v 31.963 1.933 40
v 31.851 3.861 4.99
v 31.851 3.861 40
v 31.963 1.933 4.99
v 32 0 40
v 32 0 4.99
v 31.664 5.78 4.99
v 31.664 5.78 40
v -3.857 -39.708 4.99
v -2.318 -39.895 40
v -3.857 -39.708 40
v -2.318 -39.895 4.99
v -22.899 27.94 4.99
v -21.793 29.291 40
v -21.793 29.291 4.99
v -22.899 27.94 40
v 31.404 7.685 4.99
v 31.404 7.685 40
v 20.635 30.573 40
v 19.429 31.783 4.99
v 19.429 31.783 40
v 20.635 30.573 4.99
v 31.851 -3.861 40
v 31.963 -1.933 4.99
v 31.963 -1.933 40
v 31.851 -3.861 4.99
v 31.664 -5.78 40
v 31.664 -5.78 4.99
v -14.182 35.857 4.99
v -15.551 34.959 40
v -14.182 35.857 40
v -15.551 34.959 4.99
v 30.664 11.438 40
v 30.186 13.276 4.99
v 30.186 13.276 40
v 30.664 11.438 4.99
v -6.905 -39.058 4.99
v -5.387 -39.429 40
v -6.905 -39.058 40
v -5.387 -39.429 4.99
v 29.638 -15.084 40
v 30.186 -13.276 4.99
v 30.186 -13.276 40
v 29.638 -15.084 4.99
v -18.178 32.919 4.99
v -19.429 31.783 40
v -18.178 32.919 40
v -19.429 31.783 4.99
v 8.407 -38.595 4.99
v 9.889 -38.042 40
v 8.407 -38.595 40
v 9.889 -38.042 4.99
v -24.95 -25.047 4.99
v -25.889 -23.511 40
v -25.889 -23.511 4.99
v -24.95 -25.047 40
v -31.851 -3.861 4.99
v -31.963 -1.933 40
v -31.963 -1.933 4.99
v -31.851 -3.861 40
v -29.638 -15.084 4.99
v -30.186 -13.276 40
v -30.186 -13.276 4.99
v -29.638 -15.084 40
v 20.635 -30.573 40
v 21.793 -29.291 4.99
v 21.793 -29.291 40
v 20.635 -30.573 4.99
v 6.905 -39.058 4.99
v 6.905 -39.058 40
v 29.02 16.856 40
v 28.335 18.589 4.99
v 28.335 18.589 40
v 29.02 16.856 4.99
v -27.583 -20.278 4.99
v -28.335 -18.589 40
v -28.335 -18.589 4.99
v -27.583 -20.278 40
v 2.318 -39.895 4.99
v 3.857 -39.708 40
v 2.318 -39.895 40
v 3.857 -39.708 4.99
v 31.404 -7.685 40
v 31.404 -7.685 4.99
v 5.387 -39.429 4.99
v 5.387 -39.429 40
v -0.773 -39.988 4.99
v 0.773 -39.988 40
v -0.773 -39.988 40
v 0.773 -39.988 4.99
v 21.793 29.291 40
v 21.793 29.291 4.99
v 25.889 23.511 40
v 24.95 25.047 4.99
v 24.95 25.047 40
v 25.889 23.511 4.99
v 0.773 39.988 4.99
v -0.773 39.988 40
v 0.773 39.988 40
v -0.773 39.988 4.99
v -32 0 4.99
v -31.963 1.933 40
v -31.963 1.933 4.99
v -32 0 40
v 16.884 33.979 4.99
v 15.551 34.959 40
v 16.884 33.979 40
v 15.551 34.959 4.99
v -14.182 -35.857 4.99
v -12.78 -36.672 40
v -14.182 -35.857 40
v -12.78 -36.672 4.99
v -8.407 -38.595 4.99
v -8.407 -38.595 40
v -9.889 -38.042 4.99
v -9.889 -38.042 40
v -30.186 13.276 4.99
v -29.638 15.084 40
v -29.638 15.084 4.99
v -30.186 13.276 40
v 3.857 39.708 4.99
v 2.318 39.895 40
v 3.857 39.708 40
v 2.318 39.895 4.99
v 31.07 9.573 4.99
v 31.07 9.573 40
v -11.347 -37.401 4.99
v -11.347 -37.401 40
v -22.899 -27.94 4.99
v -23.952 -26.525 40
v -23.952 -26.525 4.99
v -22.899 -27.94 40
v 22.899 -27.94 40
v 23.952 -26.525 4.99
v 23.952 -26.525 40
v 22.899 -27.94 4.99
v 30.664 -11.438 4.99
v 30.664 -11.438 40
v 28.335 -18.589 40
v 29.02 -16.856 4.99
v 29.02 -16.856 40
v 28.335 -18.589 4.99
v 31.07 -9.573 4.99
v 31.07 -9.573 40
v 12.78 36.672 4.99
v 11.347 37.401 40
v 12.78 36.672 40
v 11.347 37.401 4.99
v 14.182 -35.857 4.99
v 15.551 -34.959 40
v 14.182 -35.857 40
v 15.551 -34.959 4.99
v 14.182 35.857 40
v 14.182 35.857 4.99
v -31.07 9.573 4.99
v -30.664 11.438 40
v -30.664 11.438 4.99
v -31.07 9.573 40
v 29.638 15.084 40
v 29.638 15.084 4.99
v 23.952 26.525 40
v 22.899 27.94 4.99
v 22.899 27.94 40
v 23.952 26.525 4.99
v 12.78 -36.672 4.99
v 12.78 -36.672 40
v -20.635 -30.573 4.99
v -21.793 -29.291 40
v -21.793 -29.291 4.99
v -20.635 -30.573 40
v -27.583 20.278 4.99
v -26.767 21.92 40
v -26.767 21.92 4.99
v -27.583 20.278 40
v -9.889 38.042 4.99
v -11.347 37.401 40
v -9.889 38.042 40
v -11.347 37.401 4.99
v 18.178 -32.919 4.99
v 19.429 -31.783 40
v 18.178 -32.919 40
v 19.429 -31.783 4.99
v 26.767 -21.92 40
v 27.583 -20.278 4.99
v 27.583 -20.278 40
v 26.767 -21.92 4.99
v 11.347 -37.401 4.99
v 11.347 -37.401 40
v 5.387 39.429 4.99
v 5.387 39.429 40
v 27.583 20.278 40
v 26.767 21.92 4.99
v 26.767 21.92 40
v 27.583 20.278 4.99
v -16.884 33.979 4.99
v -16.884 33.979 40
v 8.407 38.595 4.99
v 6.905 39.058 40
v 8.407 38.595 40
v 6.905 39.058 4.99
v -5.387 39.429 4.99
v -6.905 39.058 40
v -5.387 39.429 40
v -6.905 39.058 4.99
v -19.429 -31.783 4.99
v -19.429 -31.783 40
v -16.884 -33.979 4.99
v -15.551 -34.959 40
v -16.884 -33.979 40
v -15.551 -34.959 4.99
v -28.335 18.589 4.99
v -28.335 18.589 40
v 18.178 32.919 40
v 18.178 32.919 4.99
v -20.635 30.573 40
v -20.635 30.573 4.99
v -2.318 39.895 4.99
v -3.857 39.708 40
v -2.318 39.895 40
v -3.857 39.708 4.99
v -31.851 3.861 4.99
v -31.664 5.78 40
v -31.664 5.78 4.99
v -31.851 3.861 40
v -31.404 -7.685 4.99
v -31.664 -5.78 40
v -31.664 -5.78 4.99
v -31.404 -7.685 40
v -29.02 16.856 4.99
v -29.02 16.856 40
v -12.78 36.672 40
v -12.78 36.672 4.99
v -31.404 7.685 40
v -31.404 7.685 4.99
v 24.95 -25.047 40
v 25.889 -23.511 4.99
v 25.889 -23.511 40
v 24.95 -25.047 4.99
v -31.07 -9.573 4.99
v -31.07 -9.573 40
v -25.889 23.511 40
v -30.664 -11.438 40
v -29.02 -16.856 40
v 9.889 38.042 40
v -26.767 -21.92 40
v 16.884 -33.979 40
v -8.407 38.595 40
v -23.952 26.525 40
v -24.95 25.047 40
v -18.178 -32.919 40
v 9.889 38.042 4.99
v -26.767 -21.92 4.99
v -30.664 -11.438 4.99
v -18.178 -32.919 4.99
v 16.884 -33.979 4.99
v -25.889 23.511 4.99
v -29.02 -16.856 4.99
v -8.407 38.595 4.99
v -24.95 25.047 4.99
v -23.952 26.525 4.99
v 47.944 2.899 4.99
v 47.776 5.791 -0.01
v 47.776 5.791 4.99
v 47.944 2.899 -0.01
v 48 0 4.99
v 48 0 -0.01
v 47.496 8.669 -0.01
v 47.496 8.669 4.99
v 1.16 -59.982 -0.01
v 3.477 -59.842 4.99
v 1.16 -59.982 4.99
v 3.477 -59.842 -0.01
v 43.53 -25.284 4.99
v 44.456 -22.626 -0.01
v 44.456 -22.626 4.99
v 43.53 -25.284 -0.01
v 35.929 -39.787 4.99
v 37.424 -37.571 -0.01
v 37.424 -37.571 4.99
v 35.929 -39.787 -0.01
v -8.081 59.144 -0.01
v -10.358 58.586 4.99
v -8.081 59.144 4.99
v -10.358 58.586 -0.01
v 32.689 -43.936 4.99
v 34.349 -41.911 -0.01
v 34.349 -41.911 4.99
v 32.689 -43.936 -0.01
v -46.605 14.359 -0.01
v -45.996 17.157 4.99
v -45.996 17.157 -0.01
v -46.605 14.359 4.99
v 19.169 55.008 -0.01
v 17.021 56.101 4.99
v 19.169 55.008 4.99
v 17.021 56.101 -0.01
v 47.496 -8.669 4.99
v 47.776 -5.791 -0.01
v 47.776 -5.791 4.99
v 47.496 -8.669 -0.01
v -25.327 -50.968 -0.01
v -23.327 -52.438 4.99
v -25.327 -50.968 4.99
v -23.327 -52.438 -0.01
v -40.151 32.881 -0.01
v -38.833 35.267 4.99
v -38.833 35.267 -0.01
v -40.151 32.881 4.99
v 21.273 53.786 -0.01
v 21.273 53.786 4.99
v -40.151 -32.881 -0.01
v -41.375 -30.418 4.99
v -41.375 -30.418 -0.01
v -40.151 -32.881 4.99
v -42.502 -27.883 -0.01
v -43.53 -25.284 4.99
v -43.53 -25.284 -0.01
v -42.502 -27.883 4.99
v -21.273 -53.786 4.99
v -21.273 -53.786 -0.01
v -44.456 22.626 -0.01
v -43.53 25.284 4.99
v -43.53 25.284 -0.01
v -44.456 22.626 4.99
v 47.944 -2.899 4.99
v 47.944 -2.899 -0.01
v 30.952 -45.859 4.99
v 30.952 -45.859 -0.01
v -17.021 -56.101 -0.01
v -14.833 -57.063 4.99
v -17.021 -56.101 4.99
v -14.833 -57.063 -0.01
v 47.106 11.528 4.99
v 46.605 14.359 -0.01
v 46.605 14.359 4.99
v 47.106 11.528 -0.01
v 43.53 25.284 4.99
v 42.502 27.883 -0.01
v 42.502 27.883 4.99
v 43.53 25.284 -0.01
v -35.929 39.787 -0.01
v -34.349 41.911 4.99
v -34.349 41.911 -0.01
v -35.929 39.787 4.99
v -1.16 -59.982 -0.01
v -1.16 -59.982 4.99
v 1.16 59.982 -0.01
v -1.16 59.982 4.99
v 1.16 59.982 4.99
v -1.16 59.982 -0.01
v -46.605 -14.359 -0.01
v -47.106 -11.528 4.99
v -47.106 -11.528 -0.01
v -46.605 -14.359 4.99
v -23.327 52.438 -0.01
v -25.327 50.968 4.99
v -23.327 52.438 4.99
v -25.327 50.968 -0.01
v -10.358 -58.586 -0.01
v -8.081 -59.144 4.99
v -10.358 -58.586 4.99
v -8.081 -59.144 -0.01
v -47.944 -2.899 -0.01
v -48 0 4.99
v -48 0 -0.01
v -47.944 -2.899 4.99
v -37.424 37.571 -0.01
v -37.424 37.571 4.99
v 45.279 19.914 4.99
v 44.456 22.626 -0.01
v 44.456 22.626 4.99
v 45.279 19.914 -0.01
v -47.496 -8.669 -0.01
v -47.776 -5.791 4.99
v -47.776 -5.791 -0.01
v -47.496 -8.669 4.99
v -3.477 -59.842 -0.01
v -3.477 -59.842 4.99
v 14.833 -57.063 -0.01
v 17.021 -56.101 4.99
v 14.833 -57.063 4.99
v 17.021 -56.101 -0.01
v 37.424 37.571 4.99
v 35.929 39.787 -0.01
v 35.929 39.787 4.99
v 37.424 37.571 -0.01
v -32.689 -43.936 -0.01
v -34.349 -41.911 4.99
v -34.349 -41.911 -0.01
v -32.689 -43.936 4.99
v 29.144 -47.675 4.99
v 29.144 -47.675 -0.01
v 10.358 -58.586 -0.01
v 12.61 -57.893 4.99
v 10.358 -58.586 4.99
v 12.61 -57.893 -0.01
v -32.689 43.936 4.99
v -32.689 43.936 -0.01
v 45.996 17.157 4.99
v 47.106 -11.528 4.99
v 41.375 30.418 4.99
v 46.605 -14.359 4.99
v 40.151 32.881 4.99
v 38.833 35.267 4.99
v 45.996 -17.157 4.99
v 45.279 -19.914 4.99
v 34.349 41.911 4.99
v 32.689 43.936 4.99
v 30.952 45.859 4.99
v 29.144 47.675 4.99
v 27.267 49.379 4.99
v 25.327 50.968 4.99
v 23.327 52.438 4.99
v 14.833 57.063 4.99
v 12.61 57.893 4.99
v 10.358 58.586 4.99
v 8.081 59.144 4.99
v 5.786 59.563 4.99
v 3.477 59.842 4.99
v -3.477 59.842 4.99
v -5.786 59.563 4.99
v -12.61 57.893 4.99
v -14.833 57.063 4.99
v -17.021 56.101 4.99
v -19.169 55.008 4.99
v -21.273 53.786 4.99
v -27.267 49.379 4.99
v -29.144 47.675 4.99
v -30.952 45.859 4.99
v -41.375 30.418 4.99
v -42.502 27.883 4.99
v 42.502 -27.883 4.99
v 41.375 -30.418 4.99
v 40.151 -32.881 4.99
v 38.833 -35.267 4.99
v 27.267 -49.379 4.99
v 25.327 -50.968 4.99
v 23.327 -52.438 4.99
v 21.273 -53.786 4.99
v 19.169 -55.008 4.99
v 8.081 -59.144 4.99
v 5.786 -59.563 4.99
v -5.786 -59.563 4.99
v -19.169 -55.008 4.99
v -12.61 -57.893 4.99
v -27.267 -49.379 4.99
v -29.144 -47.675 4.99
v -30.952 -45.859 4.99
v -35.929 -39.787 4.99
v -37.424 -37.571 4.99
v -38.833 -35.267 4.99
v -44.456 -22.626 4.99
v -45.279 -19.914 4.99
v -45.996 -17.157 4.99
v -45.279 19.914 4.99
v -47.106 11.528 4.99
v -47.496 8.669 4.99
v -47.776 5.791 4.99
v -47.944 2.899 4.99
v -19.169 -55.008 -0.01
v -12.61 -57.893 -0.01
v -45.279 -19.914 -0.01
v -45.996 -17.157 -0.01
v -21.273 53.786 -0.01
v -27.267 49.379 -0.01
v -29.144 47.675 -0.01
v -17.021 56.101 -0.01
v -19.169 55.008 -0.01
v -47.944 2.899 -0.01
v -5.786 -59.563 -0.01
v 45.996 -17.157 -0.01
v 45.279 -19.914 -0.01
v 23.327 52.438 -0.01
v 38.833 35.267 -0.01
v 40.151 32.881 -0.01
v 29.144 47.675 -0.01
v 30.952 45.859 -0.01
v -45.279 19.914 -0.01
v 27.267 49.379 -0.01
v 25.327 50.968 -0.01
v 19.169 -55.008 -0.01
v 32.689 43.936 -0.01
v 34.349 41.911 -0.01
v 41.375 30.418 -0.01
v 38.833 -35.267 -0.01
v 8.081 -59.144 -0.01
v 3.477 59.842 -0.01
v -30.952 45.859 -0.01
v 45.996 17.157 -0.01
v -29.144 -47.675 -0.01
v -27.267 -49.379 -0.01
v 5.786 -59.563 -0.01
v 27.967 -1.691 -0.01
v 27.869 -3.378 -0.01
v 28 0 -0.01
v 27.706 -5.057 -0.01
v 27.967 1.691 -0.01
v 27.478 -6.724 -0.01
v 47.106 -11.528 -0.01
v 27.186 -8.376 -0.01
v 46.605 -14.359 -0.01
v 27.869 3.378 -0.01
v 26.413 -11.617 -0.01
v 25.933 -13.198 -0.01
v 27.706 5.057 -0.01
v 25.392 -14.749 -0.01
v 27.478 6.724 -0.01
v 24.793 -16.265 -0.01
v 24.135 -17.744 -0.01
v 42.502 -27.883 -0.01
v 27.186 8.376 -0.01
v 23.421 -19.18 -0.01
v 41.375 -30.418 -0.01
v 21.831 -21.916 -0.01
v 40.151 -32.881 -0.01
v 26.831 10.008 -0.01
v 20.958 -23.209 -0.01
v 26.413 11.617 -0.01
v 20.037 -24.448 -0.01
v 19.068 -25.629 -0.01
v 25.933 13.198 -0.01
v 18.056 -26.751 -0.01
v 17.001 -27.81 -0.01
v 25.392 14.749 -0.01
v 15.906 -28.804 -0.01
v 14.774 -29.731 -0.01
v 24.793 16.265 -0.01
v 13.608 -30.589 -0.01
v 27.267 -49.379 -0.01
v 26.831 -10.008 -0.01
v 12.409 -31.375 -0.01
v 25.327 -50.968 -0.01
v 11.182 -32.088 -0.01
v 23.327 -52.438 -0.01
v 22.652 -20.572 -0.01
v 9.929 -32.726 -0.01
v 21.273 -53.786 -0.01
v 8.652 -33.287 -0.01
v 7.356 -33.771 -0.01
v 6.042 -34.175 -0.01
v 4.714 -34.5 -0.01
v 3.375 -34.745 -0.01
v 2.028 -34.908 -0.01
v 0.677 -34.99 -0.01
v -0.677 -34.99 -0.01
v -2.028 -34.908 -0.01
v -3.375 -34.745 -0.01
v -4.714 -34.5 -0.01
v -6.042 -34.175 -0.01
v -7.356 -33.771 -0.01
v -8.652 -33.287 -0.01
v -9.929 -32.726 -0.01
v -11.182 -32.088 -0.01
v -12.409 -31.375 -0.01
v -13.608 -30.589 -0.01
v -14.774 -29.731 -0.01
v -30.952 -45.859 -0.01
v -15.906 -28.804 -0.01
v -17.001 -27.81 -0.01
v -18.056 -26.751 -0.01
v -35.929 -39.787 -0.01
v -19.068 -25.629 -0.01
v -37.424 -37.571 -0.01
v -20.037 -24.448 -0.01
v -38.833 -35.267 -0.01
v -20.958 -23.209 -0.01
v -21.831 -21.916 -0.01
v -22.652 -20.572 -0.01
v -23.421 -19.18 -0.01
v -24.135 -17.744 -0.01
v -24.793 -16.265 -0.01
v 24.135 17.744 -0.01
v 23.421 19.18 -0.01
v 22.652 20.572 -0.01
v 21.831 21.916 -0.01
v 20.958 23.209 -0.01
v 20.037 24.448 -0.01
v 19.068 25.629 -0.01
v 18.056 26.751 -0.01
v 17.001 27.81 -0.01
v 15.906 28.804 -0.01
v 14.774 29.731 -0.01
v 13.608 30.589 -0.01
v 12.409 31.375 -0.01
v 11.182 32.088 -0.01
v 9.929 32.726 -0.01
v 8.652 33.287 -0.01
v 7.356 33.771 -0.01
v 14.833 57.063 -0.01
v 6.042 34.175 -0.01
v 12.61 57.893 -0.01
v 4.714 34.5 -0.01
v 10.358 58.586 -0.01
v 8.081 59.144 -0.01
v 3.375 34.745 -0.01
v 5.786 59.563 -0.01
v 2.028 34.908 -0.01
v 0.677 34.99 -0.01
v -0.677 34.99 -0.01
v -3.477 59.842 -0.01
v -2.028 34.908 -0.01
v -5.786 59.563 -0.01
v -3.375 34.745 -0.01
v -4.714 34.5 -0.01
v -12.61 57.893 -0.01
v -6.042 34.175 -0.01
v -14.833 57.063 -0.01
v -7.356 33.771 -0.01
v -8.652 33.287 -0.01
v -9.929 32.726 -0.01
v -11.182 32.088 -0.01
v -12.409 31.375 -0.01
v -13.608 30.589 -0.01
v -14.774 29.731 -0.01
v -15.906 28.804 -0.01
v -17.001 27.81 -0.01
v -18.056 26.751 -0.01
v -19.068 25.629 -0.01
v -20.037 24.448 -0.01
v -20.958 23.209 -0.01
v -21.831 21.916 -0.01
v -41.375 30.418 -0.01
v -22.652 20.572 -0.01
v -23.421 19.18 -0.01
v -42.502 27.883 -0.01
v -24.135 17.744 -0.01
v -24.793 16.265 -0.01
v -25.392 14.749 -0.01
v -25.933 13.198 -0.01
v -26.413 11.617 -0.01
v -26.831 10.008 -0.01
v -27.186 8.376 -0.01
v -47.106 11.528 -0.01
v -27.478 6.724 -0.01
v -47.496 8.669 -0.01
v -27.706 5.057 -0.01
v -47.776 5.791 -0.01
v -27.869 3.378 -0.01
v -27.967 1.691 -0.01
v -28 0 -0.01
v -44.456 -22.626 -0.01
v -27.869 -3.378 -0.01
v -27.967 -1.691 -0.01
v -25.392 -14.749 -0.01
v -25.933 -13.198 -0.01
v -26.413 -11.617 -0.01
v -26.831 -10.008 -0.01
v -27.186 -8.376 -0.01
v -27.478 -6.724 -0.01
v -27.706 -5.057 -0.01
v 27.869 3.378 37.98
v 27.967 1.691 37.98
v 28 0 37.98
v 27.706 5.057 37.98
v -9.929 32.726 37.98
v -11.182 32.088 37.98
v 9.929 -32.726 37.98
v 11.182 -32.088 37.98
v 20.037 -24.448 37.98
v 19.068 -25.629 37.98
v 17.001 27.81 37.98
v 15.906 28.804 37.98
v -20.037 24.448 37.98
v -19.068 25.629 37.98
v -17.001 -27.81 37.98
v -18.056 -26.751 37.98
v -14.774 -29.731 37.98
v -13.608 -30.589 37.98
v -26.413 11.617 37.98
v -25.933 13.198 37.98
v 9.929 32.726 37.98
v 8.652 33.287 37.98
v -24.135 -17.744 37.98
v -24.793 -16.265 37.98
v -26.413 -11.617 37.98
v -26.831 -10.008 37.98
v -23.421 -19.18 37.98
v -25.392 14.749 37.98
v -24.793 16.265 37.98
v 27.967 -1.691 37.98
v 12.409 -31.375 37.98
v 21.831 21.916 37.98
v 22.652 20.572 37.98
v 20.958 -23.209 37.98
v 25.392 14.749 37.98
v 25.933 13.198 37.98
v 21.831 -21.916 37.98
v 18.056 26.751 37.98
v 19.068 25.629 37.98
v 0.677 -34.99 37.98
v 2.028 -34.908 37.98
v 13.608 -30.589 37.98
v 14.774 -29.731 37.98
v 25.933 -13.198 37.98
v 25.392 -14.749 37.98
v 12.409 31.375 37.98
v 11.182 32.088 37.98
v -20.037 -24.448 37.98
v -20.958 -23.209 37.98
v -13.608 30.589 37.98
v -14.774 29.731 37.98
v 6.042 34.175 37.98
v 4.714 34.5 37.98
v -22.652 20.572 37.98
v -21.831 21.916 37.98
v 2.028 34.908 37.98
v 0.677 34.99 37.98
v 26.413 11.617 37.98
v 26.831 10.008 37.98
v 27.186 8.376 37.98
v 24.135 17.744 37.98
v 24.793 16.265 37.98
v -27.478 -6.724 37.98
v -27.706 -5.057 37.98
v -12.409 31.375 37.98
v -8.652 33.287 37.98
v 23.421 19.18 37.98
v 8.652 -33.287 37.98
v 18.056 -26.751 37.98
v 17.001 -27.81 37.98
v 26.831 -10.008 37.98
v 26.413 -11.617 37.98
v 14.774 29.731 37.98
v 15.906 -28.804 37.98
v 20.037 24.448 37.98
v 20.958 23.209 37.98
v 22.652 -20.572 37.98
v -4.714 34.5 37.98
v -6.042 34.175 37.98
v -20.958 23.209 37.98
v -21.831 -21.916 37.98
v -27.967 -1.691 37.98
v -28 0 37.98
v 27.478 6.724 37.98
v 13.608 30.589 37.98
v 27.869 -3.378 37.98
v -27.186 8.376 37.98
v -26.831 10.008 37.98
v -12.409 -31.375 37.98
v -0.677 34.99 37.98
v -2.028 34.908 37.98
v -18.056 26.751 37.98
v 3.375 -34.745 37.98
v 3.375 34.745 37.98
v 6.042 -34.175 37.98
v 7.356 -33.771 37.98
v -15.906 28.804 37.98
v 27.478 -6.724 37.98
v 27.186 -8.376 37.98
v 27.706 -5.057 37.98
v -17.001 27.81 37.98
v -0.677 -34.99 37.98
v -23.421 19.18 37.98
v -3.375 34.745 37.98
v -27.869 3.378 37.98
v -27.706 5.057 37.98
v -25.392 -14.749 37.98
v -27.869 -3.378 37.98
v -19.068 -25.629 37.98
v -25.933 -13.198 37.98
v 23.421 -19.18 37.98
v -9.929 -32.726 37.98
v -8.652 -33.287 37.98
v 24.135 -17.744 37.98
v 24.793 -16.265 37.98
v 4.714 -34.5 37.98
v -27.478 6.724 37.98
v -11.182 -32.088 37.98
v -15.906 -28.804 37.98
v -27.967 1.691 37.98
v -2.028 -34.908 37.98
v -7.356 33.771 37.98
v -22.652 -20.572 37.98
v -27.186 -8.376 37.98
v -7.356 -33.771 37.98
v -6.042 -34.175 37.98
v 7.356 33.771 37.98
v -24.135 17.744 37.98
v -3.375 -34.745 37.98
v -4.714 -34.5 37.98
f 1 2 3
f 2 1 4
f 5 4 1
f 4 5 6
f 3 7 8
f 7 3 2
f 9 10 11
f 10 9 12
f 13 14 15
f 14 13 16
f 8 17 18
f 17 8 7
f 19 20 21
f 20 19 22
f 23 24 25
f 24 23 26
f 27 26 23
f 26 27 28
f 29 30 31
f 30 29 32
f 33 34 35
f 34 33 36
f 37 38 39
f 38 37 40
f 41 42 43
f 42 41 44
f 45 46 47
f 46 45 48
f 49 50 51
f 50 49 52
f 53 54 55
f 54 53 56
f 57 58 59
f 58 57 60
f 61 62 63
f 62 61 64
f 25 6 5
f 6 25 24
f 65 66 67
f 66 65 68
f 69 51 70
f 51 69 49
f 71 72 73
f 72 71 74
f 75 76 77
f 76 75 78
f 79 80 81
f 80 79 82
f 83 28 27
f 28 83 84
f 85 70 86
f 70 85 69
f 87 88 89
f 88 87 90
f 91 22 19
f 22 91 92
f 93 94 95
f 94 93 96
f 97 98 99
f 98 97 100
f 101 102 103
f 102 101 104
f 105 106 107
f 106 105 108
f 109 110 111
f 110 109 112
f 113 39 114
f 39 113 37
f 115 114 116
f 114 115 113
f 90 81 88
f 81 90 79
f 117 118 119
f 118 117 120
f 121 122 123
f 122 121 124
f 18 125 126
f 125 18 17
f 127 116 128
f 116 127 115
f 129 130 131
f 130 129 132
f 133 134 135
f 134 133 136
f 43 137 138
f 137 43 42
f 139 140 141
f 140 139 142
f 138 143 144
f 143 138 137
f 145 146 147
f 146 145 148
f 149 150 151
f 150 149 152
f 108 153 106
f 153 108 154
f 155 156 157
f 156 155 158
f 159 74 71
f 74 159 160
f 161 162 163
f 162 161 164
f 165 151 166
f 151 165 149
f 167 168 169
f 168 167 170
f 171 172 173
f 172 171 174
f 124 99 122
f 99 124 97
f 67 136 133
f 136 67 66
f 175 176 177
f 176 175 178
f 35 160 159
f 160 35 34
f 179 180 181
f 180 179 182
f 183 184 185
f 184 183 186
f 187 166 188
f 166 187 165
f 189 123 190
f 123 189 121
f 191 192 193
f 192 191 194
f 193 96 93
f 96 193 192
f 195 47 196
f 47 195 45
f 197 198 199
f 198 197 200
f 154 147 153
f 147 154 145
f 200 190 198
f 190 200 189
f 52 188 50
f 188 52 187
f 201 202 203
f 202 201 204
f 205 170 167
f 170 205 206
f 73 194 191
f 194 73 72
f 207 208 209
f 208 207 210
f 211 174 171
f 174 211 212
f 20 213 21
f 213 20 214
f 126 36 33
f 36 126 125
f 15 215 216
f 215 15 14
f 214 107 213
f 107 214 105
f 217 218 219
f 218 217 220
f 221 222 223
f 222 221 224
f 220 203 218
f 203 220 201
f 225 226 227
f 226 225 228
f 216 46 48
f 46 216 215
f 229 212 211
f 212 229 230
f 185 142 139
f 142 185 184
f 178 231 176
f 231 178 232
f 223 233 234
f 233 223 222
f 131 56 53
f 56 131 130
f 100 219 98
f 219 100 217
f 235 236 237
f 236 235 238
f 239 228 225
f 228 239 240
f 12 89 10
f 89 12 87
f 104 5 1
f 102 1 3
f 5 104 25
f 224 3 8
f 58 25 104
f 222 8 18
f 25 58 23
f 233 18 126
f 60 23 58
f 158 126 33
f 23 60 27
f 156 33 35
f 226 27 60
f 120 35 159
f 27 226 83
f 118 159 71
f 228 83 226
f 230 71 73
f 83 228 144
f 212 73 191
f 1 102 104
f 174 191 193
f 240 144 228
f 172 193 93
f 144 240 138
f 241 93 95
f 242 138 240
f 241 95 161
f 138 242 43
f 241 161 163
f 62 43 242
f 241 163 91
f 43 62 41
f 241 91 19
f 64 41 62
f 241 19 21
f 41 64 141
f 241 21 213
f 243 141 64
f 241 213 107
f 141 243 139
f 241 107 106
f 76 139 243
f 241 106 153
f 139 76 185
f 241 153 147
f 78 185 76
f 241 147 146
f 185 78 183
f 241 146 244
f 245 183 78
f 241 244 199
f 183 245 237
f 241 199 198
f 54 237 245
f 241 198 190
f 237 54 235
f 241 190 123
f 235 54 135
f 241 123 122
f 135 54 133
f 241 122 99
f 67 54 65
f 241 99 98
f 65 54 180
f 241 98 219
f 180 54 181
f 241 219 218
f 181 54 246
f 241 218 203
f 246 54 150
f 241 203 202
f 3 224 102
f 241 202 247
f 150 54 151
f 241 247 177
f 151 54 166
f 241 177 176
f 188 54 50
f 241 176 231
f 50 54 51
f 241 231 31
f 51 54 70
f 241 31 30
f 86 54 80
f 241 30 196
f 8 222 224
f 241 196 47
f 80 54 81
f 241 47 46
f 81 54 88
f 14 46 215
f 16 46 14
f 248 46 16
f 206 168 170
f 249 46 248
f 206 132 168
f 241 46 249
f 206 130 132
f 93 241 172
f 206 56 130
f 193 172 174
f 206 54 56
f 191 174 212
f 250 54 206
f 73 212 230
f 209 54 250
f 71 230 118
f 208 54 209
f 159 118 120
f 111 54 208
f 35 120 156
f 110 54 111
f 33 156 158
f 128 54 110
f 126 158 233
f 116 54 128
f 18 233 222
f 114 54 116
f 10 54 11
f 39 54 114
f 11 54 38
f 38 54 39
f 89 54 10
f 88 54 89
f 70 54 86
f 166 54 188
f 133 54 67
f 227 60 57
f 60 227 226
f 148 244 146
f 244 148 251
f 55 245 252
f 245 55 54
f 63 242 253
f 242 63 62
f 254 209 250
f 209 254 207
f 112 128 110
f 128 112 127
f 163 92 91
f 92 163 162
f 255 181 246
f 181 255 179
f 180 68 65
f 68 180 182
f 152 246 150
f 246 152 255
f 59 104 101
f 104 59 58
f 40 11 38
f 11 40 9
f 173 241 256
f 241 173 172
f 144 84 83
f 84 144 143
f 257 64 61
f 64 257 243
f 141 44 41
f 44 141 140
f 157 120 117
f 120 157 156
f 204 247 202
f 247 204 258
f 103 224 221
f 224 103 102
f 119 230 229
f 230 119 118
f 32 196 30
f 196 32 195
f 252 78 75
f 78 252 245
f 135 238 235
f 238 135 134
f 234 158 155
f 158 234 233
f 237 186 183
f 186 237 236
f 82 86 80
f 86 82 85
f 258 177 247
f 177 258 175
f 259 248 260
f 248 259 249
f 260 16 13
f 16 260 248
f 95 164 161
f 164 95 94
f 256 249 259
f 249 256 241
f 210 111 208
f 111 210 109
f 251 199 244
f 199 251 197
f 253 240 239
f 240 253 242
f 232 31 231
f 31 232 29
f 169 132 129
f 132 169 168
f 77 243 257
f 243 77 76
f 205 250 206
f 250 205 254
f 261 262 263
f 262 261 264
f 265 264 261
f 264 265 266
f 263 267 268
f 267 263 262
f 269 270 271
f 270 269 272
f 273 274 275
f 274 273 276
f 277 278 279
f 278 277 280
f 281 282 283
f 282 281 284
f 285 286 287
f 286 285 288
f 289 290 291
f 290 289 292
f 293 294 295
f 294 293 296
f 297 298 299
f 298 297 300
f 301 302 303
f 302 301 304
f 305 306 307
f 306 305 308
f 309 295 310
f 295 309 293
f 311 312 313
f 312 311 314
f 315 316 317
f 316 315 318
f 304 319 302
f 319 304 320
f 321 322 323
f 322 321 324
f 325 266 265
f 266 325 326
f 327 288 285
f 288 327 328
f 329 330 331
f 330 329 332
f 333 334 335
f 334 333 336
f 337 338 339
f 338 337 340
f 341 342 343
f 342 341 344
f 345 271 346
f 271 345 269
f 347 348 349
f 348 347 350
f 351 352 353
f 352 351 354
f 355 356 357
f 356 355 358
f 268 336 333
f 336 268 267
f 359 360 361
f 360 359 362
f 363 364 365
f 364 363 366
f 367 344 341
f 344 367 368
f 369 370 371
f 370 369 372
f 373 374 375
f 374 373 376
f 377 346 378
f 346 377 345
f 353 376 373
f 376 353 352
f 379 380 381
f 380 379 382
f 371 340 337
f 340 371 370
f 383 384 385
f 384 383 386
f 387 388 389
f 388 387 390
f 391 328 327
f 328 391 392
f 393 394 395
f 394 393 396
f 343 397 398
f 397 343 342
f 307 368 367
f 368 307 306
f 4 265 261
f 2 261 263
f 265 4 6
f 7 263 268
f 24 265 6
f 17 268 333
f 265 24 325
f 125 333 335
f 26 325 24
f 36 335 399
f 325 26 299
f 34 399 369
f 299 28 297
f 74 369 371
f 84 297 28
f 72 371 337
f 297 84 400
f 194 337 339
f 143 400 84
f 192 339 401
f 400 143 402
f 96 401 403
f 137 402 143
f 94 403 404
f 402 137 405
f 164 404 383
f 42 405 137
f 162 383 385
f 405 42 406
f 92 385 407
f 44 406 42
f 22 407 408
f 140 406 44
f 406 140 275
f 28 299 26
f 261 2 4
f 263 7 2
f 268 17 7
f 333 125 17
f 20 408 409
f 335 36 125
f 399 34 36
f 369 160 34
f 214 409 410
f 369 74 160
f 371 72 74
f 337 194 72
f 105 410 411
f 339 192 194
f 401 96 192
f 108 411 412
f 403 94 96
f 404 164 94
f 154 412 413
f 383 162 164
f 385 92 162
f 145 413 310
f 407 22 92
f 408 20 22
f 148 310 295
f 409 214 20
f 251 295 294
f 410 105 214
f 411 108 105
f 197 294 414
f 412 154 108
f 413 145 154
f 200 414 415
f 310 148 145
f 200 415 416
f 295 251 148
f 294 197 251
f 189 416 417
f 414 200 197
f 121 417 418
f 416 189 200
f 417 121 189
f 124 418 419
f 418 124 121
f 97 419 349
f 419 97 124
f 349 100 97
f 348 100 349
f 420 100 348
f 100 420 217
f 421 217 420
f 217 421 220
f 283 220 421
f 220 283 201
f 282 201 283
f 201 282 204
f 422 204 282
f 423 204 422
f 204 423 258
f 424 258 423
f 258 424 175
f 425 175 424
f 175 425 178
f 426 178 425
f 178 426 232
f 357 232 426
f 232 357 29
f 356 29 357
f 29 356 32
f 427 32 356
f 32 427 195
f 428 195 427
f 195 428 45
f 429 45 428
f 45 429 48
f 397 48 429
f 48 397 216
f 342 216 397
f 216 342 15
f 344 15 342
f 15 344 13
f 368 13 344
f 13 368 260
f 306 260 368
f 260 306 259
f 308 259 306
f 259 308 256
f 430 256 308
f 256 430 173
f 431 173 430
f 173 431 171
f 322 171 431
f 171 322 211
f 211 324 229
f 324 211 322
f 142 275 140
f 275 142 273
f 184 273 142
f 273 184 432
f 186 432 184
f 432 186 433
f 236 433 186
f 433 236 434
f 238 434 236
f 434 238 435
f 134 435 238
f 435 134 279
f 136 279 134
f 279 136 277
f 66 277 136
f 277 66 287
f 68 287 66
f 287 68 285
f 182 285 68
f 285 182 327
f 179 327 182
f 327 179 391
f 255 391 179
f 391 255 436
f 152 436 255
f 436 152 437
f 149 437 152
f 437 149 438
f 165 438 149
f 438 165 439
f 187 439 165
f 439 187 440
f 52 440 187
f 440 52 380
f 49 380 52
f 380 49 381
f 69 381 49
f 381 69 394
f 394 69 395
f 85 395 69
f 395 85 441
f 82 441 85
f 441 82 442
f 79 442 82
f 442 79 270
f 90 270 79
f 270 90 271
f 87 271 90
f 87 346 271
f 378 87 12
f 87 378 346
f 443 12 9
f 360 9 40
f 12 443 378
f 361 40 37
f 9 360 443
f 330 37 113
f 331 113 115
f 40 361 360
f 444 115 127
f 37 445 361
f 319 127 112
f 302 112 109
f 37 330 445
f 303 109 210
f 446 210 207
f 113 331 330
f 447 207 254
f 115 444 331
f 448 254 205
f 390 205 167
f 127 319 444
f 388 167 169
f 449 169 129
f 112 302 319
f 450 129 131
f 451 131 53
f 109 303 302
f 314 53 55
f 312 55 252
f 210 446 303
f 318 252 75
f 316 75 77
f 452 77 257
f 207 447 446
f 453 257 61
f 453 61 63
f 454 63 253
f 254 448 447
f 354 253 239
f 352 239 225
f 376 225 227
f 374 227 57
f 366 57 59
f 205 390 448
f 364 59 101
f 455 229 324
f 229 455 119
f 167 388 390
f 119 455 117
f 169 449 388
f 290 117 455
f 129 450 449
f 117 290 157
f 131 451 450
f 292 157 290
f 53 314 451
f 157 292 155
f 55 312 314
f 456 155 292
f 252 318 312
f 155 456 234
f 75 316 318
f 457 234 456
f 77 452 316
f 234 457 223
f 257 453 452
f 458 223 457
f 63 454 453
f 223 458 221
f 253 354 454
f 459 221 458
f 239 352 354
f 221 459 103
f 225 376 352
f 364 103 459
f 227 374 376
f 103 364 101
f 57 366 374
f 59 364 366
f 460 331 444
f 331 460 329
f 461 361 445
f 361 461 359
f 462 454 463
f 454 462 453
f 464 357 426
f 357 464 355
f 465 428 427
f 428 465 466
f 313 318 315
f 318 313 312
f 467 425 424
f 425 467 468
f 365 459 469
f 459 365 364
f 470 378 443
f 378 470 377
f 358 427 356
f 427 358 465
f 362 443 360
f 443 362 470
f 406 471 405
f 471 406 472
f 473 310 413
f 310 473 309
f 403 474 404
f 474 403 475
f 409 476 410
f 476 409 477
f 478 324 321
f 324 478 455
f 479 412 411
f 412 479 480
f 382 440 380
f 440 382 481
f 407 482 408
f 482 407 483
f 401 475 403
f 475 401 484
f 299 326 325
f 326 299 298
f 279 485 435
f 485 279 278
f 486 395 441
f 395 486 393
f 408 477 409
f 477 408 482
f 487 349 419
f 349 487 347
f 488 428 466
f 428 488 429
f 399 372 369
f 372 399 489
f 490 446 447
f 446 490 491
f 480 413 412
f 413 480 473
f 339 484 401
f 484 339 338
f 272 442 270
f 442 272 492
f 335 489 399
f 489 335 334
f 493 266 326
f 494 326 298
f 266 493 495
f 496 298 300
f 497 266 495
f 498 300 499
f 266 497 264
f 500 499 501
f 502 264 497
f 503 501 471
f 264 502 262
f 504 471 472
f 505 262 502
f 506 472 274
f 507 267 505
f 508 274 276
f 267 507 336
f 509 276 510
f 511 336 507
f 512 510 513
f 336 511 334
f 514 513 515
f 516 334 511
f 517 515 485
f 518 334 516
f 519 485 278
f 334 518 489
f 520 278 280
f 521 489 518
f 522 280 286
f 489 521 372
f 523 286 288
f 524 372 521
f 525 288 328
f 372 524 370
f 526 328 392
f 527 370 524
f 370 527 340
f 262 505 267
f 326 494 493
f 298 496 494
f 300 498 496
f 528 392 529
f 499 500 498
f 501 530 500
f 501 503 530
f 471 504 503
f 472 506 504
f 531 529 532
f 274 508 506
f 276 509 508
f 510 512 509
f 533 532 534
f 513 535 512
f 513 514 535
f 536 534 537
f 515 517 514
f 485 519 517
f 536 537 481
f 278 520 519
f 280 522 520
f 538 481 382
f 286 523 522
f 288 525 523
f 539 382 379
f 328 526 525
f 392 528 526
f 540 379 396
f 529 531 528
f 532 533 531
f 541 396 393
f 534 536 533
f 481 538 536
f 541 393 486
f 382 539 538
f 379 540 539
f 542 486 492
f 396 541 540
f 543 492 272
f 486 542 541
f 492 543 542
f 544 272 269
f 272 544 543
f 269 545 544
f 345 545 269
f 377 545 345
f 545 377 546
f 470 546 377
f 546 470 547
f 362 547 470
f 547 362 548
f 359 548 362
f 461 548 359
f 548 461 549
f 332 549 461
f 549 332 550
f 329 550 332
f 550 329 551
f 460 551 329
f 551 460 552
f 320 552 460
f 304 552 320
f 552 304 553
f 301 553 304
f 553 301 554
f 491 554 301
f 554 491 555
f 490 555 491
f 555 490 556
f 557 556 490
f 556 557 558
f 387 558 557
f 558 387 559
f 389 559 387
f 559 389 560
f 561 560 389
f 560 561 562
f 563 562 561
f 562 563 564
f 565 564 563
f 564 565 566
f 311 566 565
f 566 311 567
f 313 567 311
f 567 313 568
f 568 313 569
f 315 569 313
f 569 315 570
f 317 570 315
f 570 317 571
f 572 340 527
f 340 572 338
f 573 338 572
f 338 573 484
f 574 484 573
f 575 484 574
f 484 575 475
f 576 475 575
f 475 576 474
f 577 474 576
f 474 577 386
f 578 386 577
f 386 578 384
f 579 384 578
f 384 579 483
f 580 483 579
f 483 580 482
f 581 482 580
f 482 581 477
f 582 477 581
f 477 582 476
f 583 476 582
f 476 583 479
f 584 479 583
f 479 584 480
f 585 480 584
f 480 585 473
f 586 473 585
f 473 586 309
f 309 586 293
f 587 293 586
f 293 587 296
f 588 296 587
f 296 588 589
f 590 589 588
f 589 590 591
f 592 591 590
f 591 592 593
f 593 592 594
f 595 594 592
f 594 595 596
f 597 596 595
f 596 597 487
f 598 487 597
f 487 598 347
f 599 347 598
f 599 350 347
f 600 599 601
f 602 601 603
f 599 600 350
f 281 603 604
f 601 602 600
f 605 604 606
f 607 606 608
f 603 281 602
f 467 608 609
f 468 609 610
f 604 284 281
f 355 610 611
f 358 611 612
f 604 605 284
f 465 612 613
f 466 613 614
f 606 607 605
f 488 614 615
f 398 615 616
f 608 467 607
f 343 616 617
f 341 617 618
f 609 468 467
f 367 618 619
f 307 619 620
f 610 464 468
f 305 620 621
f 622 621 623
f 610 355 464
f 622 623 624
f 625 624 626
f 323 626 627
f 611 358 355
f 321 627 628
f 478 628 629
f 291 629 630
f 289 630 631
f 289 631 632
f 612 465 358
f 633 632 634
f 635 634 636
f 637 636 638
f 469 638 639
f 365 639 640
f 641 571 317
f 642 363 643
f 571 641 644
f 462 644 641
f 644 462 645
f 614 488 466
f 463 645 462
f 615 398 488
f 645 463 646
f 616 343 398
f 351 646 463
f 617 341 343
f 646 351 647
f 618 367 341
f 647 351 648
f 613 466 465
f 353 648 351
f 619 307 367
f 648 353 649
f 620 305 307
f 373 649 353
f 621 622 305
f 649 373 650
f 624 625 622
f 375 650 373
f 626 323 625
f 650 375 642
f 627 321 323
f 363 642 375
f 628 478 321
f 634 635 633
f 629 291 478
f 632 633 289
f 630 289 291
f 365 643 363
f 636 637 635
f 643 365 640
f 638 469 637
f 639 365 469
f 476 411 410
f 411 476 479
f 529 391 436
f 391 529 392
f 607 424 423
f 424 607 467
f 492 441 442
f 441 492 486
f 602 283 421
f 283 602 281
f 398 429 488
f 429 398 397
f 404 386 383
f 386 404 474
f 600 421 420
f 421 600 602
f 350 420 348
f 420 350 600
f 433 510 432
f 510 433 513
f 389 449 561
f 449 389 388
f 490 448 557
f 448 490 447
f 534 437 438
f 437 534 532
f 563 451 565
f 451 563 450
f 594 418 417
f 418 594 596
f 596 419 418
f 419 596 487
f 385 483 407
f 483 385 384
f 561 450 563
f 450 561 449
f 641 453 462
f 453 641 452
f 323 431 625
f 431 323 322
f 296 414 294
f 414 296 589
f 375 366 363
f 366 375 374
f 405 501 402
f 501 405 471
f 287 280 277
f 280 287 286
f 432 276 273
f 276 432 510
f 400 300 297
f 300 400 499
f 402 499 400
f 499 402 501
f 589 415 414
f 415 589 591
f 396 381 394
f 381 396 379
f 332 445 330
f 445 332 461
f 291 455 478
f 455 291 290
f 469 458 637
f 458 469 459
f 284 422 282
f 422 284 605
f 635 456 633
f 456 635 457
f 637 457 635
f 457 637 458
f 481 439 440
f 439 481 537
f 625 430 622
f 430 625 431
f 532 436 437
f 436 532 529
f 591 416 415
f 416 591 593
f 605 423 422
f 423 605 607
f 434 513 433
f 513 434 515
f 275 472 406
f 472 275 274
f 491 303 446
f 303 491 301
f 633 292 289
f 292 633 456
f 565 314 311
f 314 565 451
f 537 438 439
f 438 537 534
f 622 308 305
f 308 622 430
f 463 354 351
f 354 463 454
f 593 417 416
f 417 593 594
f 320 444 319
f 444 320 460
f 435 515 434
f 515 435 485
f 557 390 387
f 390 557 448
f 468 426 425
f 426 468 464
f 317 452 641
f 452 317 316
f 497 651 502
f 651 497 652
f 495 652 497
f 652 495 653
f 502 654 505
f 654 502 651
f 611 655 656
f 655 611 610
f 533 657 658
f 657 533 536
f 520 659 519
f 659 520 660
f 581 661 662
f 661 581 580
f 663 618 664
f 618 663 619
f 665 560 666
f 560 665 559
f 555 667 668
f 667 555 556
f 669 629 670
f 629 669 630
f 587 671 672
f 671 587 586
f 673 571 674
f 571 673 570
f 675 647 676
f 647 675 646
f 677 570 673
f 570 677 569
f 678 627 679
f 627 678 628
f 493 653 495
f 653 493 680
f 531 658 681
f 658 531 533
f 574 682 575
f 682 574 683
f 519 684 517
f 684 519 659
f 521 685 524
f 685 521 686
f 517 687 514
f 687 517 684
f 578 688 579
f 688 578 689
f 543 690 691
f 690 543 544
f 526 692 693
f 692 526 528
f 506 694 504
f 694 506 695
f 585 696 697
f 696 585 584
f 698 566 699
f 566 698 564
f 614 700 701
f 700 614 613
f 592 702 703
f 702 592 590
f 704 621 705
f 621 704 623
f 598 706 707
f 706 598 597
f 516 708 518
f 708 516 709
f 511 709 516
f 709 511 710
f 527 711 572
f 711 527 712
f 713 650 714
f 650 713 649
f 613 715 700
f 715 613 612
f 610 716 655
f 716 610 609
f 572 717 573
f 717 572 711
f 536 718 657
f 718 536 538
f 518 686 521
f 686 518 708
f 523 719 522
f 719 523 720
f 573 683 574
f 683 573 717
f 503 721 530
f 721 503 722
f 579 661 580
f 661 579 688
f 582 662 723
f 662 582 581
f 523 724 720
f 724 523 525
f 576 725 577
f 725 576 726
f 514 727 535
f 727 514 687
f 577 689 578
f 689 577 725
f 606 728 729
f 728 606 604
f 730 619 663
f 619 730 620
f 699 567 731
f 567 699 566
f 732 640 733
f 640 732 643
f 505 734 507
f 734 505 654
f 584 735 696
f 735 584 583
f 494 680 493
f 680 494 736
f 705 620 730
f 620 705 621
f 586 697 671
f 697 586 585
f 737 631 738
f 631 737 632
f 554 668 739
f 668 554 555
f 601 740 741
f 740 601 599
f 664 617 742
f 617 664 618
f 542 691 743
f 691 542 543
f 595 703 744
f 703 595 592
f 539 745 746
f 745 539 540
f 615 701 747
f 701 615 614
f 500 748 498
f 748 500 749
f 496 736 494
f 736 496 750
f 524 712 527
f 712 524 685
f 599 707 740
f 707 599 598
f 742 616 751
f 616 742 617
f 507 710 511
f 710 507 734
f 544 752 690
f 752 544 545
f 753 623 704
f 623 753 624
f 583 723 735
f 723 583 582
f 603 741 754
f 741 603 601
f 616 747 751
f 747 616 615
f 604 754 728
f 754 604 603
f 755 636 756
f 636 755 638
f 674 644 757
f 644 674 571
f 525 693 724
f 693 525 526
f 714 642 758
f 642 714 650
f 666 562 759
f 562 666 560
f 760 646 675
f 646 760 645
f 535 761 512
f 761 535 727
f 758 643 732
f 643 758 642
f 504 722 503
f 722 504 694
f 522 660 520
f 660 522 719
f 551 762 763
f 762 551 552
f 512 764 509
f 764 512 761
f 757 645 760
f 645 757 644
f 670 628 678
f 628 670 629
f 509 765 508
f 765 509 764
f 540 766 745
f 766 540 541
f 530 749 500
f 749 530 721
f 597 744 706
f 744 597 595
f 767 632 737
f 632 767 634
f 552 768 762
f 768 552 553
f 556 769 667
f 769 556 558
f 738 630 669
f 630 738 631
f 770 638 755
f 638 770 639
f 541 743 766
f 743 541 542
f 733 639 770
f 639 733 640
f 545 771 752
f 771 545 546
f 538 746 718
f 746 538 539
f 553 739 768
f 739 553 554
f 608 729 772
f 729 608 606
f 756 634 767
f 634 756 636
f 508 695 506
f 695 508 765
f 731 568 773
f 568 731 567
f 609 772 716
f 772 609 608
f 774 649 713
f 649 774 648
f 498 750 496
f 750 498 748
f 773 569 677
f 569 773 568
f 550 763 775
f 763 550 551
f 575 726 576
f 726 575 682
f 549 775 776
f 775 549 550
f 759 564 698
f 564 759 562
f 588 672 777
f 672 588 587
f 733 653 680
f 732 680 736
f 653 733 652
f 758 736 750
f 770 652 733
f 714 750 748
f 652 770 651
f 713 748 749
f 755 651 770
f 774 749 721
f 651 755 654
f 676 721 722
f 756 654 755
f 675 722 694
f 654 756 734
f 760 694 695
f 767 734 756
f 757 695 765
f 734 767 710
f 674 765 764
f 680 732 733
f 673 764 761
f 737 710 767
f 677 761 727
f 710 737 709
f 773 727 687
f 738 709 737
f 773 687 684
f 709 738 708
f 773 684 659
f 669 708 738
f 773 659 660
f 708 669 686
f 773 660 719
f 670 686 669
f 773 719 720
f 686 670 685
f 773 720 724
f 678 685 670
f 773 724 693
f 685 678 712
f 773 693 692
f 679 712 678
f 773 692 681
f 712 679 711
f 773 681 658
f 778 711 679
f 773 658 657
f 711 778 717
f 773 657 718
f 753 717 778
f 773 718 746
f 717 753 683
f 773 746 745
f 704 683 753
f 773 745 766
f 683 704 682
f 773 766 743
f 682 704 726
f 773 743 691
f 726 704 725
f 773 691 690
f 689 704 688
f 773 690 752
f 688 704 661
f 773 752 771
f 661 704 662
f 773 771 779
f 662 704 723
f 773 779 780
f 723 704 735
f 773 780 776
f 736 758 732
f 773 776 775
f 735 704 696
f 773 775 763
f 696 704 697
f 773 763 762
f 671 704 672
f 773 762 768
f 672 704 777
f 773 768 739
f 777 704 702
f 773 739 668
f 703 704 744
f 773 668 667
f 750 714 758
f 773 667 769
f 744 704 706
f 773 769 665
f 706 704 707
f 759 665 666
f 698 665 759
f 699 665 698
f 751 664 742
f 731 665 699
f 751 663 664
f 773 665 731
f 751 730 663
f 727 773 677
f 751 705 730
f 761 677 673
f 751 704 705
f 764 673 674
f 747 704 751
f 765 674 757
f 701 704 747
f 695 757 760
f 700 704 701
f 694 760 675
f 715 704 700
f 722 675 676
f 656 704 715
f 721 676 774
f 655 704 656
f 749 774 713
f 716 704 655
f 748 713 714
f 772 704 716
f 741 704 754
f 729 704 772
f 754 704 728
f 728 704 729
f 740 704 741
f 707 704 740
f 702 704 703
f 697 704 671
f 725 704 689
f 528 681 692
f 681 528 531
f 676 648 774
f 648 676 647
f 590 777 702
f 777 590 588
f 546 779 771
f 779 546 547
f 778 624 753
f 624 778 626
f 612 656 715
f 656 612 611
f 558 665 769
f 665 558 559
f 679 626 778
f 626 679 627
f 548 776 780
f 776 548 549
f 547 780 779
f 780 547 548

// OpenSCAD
$fn = 130;

arm_length = 200;
finger_length = 30;
finger_radius = 3;
arm_radius = 5;

nose_radius = 7.0;
nose_length = 40.0;

module arm() {
    translate([0, 3, 0]) linear_extrude(height=arm_length, twist=80, scale=0.7) translate([5.0, 0, 0])
        polygon([
            [cos(0)*arm_radius*0.90,   sin(0)*arm_radius*0.90],
            [cos(15)*arm_radius*1.05,  sin(15)*arm_radius*1.05],
            [cos(30)*arm_radius*0.97,  sin(30)*arm_radius*0.97],
            [cos(45)*arm_radius*1.01,  sin(45)*arm_radius*1.01],
            [cos(60)*arm_radius*0.95,  sin(60)*arm_radius*0.95],
            [cos(75)*arm_radius*1.02,  sin(75)*arm_radius*1.02],
            [cos(90)*arm_radius*0.99,  sin(90)*arm_radius*0.99],
            [cos(105)*arm_radius*1.05, sin(105)*arm_radius*1.05],
            [cos(120)*arm_radius*0.92, sin(120)*arm_radius*0.92],
            [cos(135)*arm_radius*1.03, sin(135)*arm_radius*1.03],
            [cos(150)*arm_radius*0.95, sin(150)*arm_radius*0.95],
            [cos(165)*arm_radius*1.03, sin(165)*arm_radius*1.03],
            [cos(180)*arm_radius*0.94, sin(180)*arm_radius*0.94],
            [cos(195)*arm_radius*1.07, sin(195)*arm_radius*1.07],
            [cos(210)*arm_radius*0.94, sin(210)*arm_radius*0.94],
            [cos(225)*arm_radius*1.04, sin(225)*arm_radius*1.04],
            [cos(240)*arm_radius*0.98, sin(240)*arm_radius*0.98],
            [cos(255)*arm_radius*1.03, sin(255)*arm_radius*1.03],
            [cos(270)*arm_radius*0.93, sin(270)*arm_radius*0.93],
            [cos(285)*arm_radius*1.01, sin(285)*arm_radius*1.01],
            [cos(300)*arm_radius*0.96, sin(300)*arm_radius*0.96],
            [cos(315)*arm_radius*1.04, sin(315)*arm_radius*1.04],
            [cos(330)*arm_radius*0.96, sin(330)*arm_radius*0.96],
            [cos(345)*arm_radius*1.05, sin(345)*arm_radius*1.05]
        ]);

    translate([0, 0, arm_length-5]) rotate([0, 35, 0]) linear_extrude(height=finger_length, scale=0.7) circle(finger_radius);
    translate([0, 0, arm_length-10]) rotate([0, -40, 0]) linear_extrude(height=finger_length, scale=0.7) circle(finger_radius);
        translate([2, 0, arm_length-30]) rotate([0, 40, 30]) linear_extrude(height=finger_length*0.8, scale=0.7) circle(finger_radius);
}

module nose() {
    difference() {
        // carrot body
        linear_extrude(height=nose_length, scale=0.3) circle(r=nose_radius);
        
        // ridges in the carrot
        translate([0, 0, nose_length*0.22]) rotate_extrude() translate([nose_radius*(1-0.7*0.22)+0.8, 0, 0]) circle(r=1);
        translate([0, 0, nose_length*0.5]) rotate_extrude() translate([nose_radius*(1-0.7*0.5)+0.8, 0, 0]) circle(r=1);
        translate([0, 0, nose_length*0.8]) rotate_extrude() translate([nose_radius*(1-0.7*0.8)+0.8, 0, 0]) circle(r=1);
    }
    
    // rounded tip
    sphere_radius = nose_radius * 0.305;
    end_radius = nose_radius * 0.3;
    sphere_tip_height = sphere_radius-sqrt(sphere_radius*sphere_radius - end_radius*end_radius);
    translate([0, 0, nose_length-(sphere_radius-sphere_tip_height)-0.0001]) 
        intersection() {
            sphere(sphere_radius);
            translate([0, 0, 5 + sphere_radius-sphere_tip_height]) cube([10, 10, 10], center=true);
        }
        
    // stake to go into the body
    rotate([180, 0, 0]) linear_extrude(height=20, scale=0.3) circle(r=4);
}

module topHat() {
    difference() {
        union() {
            scale([0.8, 1, 1]) cylinder(h=40, r=40);
            translate([0, 0, -0.01]) scale([0.8, 1, 1]) cylinder(h=5, r=60);
        }
        translate([0, 0, -0.02]) scale([0.8, 1, 1]) cylinder(h=38, r=35);
    }
}

//arm();

//nose();

topHat();
